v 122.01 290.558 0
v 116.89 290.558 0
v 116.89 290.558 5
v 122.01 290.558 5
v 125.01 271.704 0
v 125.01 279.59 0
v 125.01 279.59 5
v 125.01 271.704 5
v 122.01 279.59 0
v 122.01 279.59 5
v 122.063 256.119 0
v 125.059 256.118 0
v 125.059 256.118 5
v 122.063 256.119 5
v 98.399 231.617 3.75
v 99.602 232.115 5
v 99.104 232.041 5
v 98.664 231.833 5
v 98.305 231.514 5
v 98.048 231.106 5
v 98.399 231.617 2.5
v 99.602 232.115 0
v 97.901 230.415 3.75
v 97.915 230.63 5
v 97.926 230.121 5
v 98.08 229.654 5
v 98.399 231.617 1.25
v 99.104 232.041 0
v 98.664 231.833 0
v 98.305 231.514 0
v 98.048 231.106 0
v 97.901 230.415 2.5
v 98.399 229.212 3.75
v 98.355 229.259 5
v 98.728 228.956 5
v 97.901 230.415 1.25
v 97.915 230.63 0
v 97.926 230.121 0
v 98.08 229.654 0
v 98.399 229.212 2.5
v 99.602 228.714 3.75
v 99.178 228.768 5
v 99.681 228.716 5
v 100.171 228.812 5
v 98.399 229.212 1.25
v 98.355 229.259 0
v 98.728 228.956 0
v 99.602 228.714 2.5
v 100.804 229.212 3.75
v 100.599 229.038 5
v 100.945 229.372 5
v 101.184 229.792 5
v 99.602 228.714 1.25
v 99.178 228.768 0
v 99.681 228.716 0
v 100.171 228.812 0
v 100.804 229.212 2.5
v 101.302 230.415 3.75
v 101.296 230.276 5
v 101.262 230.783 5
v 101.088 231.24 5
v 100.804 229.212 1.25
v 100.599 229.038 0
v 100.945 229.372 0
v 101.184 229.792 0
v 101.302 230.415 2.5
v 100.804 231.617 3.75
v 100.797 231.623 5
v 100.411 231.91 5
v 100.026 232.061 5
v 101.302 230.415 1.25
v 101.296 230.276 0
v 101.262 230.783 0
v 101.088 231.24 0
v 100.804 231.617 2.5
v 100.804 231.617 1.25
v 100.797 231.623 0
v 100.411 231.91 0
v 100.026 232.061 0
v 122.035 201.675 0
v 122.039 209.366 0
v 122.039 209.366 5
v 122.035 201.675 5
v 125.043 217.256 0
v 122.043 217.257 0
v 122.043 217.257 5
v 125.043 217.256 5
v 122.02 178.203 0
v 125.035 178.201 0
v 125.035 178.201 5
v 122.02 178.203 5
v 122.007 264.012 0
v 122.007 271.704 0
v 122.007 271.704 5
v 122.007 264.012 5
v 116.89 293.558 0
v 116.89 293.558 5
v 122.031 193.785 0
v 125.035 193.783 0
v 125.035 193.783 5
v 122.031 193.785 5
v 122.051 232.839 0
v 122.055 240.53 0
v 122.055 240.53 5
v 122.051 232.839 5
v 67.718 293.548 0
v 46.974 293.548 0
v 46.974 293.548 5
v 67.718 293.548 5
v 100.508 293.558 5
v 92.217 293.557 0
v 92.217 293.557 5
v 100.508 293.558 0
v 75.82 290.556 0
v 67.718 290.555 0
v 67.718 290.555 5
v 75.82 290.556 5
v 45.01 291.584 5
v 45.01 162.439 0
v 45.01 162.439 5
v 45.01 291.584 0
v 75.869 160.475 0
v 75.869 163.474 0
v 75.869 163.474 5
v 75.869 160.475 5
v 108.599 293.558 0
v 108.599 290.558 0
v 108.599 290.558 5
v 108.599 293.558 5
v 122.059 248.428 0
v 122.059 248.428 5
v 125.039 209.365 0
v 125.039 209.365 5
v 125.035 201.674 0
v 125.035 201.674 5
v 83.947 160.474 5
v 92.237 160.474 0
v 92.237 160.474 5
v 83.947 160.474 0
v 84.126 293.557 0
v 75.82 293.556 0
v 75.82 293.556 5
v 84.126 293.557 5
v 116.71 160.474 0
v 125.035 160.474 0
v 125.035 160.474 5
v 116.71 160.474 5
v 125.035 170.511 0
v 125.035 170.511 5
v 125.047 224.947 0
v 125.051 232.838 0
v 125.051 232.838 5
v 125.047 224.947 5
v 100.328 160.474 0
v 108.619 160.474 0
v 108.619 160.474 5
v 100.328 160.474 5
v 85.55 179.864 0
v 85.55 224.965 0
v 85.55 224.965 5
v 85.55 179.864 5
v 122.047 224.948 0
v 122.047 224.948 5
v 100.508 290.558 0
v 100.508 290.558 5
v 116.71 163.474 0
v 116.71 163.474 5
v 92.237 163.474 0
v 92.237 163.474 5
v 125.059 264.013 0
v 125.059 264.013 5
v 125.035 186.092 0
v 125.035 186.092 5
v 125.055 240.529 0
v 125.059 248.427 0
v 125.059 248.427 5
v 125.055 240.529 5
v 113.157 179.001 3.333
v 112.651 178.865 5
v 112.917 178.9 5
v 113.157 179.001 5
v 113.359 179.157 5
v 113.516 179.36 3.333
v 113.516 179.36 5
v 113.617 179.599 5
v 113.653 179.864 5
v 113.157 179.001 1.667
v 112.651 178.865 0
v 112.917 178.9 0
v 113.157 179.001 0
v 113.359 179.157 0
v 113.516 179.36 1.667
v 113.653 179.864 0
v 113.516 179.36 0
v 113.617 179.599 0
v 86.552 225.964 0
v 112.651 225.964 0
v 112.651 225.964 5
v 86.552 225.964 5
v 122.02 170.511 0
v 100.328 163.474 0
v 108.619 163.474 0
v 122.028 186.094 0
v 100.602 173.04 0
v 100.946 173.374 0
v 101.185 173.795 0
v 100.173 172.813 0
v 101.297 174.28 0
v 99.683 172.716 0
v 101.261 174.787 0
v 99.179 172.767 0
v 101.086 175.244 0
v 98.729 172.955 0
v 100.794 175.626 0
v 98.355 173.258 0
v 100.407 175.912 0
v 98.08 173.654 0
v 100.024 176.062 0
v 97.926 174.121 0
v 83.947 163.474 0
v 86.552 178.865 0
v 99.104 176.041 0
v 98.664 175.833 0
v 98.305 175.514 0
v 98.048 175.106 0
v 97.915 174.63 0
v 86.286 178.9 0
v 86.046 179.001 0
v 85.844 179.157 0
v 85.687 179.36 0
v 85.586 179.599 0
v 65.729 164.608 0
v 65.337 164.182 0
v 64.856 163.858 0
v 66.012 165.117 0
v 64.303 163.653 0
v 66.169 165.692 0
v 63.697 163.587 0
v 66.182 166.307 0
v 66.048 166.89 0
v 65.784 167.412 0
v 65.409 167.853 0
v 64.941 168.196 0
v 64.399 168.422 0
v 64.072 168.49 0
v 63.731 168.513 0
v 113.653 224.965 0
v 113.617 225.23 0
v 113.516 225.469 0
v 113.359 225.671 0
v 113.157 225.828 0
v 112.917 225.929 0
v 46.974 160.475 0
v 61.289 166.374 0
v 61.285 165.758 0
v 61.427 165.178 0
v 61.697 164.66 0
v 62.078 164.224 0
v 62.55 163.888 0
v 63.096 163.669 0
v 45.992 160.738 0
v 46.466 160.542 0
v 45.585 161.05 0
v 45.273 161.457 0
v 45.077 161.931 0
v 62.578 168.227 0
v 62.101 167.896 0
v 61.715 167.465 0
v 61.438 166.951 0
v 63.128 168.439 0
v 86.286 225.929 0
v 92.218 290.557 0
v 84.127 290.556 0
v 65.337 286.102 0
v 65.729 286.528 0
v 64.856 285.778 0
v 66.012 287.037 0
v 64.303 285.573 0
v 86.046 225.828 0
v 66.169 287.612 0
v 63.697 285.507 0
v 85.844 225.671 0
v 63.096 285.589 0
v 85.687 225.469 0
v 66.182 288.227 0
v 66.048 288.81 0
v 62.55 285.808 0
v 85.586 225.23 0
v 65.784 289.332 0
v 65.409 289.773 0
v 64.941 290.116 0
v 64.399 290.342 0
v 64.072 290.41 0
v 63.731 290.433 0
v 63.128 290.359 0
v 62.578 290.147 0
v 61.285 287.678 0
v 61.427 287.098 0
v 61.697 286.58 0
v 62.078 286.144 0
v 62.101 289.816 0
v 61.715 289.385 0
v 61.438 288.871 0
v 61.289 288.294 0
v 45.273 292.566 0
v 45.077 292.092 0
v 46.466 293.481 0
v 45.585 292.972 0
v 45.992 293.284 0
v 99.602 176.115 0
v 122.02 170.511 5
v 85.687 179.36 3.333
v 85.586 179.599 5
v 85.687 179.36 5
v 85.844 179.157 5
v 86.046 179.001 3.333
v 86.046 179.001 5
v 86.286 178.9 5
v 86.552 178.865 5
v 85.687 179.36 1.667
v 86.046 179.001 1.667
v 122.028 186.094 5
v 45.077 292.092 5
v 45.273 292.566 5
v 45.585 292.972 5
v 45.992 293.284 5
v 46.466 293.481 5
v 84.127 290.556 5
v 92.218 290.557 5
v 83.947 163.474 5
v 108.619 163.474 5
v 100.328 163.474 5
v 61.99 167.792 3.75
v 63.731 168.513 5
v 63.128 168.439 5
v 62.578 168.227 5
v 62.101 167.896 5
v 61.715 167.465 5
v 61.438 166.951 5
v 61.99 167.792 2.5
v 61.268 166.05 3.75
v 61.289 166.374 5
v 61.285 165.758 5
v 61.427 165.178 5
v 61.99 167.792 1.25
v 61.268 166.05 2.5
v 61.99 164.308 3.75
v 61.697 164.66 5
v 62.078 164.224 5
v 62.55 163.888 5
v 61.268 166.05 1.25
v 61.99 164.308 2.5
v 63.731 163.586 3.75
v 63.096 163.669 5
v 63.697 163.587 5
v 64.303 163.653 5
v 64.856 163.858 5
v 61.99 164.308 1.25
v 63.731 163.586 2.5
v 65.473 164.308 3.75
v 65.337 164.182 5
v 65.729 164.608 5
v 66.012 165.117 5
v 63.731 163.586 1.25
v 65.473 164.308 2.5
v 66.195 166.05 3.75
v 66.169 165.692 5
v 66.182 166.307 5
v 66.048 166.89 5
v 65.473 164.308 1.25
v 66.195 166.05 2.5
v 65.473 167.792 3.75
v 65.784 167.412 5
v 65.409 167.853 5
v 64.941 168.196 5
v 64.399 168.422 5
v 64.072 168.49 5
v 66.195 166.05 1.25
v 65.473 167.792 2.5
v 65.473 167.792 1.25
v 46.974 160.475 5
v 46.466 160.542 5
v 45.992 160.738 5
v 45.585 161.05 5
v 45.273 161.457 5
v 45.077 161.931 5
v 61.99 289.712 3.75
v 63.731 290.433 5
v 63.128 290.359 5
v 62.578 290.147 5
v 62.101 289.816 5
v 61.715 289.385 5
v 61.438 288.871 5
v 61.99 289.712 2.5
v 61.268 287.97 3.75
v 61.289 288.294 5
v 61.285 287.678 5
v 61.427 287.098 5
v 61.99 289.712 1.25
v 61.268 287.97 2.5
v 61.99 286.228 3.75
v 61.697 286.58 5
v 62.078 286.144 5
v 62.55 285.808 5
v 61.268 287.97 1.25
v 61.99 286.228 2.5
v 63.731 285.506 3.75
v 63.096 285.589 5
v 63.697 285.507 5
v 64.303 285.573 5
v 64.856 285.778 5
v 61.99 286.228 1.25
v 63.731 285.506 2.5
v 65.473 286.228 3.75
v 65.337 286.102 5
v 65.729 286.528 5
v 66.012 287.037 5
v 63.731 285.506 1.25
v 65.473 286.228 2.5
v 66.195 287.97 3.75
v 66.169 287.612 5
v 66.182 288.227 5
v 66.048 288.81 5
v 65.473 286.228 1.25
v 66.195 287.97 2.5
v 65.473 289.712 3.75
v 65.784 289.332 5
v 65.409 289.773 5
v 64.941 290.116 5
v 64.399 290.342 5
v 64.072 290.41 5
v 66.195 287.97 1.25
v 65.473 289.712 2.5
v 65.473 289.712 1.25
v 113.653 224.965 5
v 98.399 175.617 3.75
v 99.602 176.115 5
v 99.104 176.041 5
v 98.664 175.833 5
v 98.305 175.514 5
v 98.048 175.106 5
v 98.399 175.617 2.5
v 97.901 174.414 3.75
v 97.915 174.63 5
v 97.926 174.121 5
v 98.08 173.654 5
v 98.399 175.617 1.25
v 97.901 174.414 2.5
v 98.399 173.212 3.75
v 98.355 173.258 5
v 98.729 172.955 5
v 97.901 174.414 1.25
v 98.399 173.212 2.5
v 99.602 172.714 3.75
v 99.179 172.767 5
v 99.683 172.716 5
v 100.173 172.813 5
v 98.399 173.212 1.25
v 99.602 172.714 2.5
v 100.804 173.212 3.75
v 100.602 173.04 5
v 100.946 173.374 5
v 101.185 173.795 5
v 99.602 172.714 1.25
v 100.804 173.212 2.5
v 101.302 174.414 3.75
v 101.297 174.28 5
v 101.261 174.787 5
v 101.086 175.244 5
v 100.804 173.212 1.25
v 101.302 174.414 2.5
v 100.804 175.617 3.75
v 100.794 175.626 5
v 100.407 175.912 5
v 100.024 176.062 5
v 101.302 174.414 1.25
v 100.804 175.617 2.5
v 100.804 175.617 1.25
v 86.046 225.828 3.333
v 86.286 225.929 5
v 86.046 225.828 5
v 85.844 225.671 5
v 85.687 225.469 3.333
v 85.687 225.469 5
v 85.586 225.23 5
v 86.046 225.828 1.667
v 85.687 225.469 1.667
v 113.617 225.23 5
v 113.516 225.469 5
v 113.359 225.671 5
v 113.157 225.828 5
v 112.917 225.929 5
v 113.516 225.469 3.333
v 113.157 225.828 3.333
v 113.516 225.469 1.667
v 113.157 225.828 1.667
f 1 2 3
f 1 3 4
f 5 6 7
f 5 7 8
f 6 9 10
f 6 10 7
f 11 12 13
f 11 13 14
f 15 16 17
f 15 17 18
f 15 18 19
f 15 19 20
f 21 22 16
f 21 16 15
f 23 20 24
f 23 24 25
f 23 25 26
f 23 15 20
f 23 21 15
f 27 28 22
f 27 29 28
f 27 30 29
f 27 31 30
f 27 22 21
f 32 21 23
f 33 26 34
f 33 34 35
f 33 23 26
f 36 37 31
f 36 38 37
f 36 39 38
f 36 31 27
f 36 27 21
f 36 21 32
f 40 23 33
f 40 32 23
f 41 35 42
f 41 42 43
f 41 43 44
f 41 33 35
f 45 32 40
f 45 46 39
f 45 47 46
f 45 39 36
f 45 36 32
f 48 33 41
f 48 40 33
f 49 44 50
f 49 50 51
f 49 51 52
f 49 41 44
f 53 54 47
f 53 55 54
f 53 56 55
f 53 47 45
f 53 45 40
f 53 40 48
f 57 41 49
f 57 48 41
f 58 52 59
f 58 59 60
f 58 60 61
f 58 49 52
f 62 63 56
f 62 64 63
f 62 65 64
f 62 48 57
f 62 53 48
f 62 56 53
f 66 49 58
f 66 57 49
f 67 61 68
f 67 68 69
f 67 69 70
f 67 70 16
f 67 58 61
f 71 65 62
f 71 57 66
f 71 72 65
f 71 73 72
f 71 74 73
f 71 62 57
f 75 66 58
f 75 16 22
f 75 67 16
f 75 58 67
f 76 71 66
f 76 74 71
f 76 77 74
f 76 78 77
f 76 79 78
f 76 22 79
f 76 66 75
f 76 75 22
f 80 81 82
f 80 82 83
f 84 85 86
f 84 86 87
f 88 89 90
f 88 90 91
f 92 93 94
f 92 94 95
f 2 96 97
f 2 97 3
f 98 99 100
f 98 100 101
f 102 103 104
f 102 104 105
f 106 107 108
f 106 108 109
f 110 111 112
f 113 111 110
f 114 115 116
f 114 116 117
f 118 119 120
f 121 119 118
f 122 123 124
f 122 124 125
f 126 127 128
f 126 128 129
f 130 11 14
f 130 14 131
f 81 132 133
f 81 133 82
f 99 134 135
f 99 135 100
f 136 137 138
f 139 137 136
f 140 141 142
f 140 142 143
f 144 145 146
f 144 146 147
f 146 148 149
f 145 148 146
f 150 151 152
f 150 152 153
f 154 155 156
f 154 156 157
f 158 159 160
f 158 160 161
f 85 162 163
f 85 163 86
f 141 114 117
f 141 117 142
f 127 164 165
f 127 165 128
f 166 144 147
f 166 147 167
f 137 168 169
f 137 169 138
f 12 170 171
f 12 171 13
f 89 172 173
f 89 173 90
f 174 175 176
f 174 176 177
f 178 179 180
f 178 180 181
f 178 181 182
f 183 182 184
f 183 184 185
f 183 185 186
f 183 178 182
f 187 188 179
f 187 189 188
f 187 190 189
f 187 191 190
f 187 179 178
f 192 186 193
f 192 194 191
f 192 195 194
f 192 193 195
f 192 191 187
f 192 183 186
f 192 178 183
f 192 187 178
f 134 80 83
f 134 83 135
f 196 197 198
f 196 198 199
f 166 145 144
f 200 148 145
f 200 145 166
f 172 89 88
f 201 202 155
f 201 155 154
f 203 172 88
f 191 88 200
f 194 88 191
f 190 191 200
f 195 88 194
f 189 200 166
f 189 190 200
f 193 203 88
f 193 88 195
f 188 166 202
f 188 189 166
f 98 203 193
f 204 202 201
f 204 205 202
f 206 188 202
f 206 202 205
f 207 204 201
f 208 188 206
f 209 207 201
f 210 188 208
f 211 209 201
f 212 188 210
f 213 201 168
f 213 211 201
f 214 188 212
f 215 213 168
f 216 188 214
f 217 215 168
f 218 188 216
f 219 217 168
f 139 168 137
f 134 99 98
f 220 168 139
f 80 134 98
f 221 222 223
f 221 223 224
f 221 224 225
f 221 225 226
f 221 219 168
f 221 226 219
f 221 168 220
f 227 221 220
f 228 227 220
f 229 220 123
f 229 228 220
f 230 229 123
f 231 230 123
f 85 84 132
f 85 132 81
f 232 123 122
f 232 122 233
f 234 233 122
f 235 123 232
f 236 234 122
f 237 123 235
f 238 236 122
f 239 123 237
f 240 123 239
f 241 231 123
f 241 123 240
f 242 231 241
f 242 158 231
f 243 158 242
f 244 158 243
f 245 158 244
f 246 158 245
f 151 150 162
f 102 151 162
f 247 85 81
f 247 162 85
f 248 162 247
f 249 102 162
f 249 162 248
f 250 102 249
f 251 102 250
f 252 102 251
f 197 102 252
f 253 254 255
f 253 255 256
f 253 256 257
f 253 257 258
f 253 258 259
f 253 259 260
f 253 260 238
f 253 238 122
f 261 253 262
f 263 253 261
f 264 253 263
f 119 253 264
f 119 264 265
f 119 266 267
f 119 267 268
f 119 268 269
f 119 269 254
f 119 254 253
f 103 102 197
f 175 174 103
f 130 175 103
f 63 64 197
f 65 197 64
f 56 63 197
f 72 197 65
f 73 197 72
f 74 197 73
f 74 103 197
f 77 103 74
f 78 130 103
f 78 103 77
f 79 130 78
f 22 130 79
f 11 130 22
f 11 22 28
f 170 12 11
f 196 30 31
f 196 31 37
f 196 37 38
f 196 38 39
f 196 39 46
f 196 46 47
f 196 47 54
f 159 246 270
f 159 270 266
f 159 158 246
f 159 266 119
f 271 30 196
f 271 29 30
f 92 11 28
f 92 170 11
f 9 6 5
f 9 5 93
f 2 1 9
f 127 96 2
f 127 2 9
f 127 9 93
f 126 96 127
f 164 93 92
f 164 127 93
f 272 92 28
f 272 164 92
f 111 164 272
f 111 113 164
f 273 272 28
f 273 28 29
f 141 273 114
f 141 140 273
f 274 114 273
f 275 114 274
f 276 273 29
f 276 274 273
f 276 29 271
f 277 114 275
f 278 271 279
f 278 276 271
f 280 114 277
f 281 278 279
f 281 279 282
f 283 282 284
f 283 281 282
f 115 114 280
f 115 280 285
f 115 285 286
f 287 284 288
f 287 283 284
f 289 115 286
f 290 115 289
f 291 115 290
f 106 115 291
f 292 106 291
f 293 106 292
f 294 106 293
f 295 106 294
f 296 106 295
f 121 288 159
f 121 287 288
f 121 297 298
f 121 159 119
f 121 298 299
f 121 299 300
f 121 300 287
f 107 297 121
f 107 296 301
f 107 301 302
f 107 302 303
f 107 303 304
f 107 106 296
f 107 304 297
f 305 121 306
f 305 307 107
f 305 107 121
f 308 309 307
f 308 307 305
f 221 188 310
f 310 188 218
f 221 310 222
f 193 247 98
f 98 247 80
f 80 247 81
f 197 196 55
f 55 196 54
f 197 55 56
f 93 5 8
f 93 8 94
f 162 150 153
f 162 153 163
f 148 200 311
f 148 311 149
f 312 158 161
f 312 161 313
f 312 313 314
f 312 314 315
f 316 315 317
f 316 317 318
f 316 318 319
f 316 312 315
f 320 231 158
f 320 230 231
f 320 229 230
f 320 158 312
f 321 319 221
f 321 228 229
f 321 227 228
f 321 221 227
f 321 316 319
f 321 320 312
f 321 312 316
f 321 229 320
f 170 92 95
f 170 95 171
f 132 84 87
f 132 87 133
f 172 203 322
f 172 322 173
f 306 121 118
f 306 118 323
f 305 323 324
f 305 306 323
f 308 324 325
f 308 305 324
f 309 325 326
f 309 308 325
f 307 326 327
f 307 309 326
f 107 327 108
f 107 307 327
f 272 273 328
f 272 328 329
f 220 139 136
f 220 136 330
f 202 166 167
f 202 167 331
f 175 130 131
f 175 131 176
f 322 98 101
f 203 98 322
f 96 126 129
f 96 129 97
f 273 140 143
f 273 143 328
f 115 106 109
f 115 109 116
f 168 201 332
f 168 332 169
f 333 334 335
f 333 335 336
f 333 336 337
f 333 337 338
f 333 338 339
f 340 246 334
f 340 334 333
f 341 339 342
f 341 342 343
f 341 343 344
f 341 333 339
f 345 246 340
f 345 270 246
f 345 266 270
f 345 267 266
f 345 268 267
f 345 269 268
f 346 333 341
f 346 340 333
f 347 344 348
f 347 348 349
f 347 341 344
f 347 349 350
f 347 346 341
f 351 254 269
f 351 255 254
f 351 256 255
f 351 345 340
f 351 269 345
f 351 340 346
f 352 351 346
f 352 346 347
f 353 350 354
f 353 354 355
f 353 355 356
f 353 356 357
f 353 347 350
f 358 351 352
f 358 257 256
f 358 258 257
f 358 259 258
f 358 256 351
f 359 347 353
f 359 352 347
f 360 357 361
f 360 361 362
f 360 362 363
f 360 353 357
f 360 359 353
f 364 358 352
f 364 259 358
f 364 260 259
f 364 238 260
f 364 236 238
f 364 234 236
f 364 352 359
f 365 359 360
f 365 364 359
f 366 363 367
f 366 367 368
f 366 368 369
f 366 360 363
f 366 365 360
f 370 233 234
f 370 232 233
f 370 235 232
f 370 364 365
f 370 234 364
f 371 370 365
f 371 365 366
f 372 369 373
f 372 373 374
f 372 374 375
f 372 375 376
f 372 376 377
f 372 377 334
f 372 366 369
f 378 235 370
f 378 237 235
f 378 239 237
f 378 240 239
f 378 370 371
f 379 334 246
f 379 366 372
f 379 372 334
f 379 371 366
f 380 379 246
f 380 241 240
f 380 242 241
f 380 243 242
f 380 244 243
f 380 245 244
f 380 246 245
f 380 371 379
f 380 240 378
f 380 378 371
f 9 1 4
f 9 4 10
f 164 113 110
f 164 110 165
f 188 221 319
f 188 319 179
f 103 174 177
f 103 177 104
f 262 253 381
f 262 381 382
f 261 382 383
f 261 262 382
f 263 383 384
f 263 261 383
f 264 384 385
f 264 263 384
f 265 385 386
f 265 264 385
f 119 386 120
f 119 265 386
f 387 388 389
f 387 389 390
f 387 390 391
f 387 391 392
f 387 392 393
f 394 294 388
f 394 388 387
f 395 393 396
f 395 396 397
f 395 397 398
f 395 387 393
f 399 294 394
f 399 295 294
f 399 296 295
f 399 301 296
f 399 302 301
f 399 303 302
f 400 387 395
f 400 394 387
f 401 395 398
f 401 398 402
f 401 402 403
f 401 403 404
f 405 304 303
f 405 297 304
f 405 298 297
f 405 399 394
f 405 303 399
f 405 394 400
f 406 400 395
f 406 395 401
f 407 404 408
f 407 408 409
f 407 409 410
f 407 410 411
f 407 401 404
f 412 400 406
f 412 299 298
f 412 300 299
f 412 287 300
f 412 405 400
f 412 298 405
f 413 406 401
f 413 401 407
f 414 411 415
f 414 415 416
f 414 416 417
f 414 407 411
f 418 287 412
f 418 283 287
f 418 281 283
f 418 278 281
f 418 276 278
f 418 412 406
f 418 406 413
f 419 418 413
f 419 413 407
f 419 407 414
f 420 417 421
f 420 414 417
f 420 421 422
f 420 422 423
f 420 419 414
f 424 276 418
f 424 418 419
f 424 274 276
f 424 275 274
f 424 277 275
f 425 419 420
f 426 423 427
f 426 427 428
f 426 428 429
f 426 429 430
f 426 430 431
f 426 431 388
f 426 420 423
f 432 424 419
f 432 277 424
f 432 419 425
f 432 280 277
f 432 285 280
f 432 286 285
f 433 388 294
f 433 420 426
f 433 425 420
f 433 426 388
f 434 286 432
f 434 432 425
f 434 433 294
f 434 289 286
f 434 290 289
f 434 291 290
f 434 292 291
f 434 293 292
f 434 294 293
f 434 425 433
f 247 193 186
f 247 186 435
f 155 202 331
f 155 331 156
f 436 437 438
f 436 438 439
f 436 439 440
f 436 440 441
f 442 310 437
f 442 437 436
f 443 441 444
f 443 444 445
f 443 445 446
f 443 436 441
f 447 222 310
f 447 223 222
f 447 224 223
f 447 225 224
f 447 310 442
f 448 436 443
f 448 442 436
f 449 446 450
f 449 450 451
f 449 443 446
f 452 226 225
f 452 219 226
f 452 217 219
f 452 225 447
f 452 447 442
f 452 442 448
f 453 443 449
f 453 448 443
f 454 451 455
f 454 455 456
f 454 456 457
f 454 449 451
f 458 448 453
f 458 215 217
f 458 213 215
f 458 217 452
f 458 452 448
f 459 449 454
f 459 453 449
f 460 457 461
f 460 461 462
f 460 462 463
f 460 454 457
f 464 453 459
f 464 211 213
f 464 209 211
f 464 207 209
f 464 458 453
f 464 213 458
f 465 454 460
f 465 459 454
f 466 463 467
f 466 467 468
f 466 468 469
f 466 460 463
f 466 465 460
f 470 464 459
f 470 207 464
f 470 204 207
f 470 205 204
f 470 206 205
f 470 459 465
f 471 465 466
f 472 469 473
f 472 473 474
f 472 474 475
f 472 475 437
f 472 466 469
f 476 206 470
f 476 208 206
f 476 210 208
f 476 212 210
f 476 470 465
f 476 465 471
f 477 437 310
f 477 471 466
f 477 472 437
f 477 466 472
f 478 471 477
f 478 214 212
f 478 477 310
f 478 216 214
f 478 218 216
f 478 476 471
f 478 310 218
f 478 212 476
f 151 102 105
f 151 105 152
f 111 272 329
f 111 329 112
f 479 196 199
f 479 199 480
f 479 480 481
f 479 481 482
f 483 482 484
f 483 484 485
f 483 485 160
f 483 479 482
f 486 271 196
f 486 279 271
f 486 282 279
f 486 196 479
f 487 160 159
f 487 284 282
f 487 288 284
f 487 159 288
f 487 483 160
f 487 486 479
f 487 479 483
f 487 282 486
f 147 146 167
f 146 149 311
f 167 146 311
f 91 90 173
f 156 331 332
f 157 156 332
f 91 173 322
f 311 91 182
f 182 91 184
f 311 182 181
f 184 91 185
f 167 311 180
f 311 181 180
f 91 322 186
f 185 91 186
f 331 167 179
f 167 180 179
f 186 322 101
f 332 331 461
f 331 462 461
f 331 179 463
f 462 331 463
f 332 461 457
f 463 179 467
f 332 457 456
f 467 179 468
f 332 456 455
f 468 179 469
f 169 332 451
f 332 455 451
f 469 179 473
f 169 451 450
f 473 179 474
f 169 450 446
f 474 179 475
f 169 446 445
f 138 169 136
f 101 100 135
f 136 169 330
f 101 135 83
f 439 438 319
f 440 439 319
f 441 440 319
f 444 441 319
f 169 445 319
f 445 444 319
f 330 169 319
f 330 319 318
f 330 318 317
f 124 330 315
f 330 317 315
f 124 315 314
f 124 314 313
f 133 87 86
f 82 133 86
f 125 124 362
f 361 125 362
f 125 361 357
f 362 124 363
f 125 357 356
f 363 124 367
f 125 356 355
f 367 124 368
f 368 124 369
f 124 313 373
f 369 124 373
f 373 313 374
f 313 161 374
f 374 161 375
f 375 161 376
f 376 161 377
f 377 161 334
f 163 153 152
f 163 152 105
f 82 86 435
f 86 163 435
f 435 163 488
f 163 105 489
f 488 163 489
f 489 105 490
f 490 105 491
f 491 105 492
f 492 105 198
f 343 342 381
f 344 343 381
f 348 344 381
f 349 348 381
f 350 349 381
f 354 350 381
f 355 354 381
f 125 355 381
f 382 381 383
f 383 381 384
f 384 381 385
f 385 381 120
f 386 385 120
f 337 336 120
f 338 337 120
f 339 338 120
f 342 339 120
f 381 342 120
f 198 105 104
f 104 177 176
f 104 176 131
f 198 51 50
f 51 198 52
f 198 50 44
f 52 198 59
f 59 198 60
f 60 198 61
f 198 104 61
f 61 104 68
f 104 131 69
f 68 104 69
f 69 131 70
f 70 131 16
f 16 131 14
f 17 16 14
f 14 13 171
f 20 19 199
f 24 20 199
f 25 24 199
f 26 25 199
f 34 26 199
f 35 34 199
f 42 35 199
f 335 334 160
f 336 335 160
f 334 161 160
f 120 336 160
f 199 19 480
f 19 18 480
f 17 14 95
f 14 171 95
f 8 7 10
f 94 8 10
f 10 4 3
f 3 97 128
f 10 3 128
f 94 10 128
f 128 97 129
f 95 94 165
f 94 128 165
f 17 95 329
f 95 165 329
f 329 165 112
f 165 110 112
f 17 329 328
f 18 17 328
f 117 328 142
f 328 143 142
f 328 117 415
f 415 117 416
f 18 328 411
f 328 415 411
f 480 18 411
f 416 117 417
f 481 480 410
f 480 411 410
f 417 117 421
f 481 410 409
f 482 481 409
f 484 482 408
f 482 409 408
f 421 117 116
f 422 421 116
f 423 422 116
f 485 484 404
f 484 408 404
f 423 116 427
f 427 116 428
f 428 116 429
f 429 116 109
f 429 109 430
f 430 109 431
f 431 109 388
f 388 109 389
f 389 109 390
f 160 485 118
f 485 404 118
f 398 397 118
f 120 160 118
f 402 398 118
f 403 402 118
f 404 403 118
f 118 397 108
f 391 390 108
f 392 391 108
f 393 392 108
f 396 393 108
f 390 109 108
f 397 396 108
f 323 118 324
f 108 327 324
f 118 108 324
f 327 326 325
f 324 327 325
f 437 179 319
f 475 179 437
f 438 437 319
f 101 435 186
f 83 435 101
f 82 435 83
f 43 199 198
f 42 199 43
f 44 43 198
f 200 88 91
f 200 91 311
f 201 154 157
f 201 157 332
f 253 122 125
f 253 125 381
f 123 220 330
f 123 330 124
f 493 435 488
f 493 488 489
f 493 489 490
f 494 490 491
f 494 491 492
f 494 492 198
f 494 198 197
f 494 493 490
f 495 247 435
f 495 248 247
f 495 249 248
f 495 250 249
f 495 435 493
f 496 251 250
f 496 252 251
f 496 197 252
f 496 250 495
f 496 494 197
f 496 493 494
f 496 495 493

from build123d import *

# Parameters (mm, degrees)
BOSS_EXTRUDE1_DEPTH = 5


with BuildPart() as part:
    # Sketch1 → Boss-Extrude1 (new body)
    with BuildSketch(Plane.XY):
        with BuildLine():
            Line((122.019699995, 170.510603399), (125.035491487, 170.510603399))
            Line((125.035491487, 170.510603399), (125.035491487, 160.474074598))
            Line((125.035491487, 160.474074598), (116.710185498, 160.474074598))
            Line((116.710185498, 160.474074598), (116.710185498, 163.474068598))
            Line((116.710185498, 163.474068598), (108.619297498, 163.474068598))
            Line((108.619297498, 163.474068598), (108.619297498, 160.474074598))
            Line((108.619297498, 160.474074598), (100.328384498, 160.474074598))
            Line((100.328384498, 160.474074598), (100.328384498, 163.474068598))
            Line((100.328384498, 163.474068598), (92.237463498, 163.474068598))
            Line((92.237463498, 163.474068598), (92.237463498, 160.474074598))
            Line((92.237463498, 160.474074598), (83.946550498, 160.474074598))
            Line((83.946550498, 160.474074598), (83.946550498, 163.474068598))
            Line((83.946550498, 163.474068598), (75.868574498, 163.474068598))
            Line((75.868574498, 163.474068598), (75.868574498, 160.474804118))
            Line((75.868574498, 160.474804118), (46.973908888, 160.474804118))
            ThreePointArc((46.973908888, 160.474804118), (45.585129957, 161.050055187), (45.009878888, 162.438834118))
            Line((45.009878888, 162.438834118), (45.009878888, 291.583555118))
            ThreePointArc((45.009878888, 291.583555118), (45.585129957, 292.972334049), (46.973908888, 293.547585118))
            Line((46.973908888, 293.547585118), (67.718123868, 293.547585118))
            Line((67.718123868, 293.547585118), (67.71835615, 290.555211127))
            Line((67.71835615, 290.555211127), (75.820281125, 290.555840035))
            Line((75.820281125, 290.555840035), (75.82004825, 293.555862026))
            Line((75.82004825, 293.555862026), (84.126345225, 293.556506799))
            Line((84.126345225, 293.556506799), (84.1265781, 290.556484808))
            Line((84.1265781, 290.556484808), (92.217503076, 290.557112862))
            Line((92.217503076, 290.557112862), (92.217270201, 293.557134853))
            Line((92.217270201, 293.557134853), (100.508146176, 293.557778429))
            Line((100.508146176, 293.557778429), (100.508379051, 290.557756438))
            Line((100.508379051, 290.557756438), (108.599303027, 290.558384492))
            Line((108.599303027, 290.558384492), (108.599070151, 293.558406483))
            Line((108.599070151, 293.558406483), (116.889983151, 293.558406483))
            Line((116.889983151, 293.558406483), (116.889983151, 290.558384483))
            Line((116.889983151, 290.558384483), (122.009855888, 290.558384483))
            Line((122.009855888, 290.558384483), (122.009855888, 279.590084215))
            Line((122.009855888, 279.590084215), (125.009878888, 279.590084215))
            Line((125.009878888, 279.590084215), (125.009878888, 271.704151215))
            Line((125.009878888, 271.704151215), (122.007220126, 271.704151215))
            Line((122.007220126, 271.704151215), (122.007220126, 264.011738232))
            Line((122.007220126, 264.011738232), (125.059148145, 264.013282494))
            Line((125.059148145, 264.013282494), (125.059148145, 256.117565387))
            Line((125.059148145, 256.117565387), (122.063013449, 256.119081417))
            Line((122.063013449, 256.119081417), (122.059121879, 248.428160402))
            Line((122.059121879, 248.428160402), (125.059148145, 248.426642402))
            Line((125.059148145, 248.426642402), (125.055151734, 240.528524414))
            Line((125.055151734, 240.528524414), (122.055129118, 240.530042412))
            Line((122.055129118, 240.530042412), (122.051237547, 232.839120396))
            Line((122.051237547, 232.839120396), (125.051260163, 232.837602399))
            Line((125.051260163, 232.837602399), (125.047267389, 224.946670409))
            Line((125.047267389, 224.946670409), (122.047244773, 224.948188407))
            Line((122.047244773, 224.948188407), (122.043353202, 217.257267391))
            Line((122.043353202, 217.257267391), (125.043375818, 217.255749394))
            Line((125.043375818, 217.255749394), (125.039383043, 209.364816404))
            Line((125.039383043, 209.364816404), (122.039360427, 209.366334401))
            Line((122.039360427, 209.366334401), (122.035468871, 201.675441386))
            Line((122.035468871, 201.675441386), (125.035491487, 201.673923388))
            Line((125.035491487, 201.673923388), (125.035491487, 193.78332734))
            Line((125.035491487, 193.78332734), (122.031476282, 193.784876396))
            Line((122.031476282, 193.784876396), (122.027584712, 186.09395438))
            Line((122.027584712, 186.09395438), (125.035491487, 186.092432394))
            Line((125.035491487, 186.092432394), (125.035491487, 178.201498384))
            Line((125.035491487, 178.201498384), (122.019699995, 178.20302436))
            Line((122.019699995, 178.20302436), (122.019699995, 170.510603399))
        make_face()
        with BuildLine():
            Line((86.552275995, 178.864581399), (112.650775995, 178.864581399))
            add(Edge.make_bspline(
                [(112.650775995, 178.864581399), (113.204636995, 178.864581399), (113.652664995, 179.312256399), (113.652664995, 179.864354399)],
                knots=[0, 0, 0, 0, 1, 1, 1, 1], degree=3))
            Line((113.652664995, 179.864354399), (113.652664995, 224.964558399))
            add(Edge.make_bspline(
                [(113.652664995, 224.964558399), (113.652664995, 225.516656399), (113.204636995, 225.964331399), (112.650775995, 225.964331399)],
                knots=[0, 0, 0, 0, 1, 1, 1, 1], degree=3))
            Line((112.650775995, 225.964331399), (86.552275995, 225.964331399))
            add(Edge.make_bspline(
                [(86.552275995, 225.964331399), (85.998414995, 225.964331399), (85.550386995, 225.516656399), (85.550386995, 224.964558399)],
                knots=[0, 0, 0, 0, 1, 1, 1, 1], degree=3))
            Line((85.550386995, 224.964558399), (85.550386995, 179.864354399))
            add(Edge.make_bspline(
                [(85.550386995, 179.864354399), (85.550386995, 179.312256399), (85.998414995, 178.864581399), (86.552275995, 178.864581399)],
                knots=[0, 0, 0, 0, 1, 1, 1, 1], degree=3))
        make_face(mode=Mode.SUBTRACT)
        with BuildLine():
            add(Edge.make_bspline(
                [(97.901136995, 230.414622399), (97.901136995, 229.475528399), (98.663136995, 228.714233399), (99.601525995, 228.714233399)],
                knots=[0, 0, 0, 0, 1, 1, 1, 1], degree=3))
            add(Edge.make_bspline(
                [(99.601525995, 228.714233399), (100.539914995, 228.714233399), (101.301914995, 229.475528399), (101.301914995, 230.414622399)],
                knots=[0, 0, 0, 0, 1, 1, 1, 1], degree=3))
            add(Edge.make_bspline(
                [(101.301914995, 230.414622399), (101.301914995, 231.353364399), (100.539914995, 232.114658399), (99.601525995, 232.114658399)],
                knots=[0, 0, 0, 0, 1, 1, 1, 1], degree=3))
            add(Edge.make_bspline(
                [(99.601525995, 232.114658399), (98.663136995, 232.114658399), (97.901136995, 231.353364399), (97.901136995, 230.414622399)],
                knots=[0, 0, 0, 0, 1, 1, 1, 1], degree=3))
        make_face(mode=Mode.SUBTRACT)
        with BuildLine():
            add(Edge.make_bspline(
                [(97.901136995, 174.414290399), (97.901136995, 173.475548399), (98.663136995, 172.714254399), (99.601525995, 172.714254399)],
                knots=[0, 0, 0, 0, 1, 1, 1, 1], degree=3))
            add(Edge.make_bspline(
                [(99.601525995, 172.714254399), (100.539914995, 172.714254399), (101.301914995, 173.475548399), (101.301914995, 174.414290399)],
                knots=[0, 0, 0, 0, 1, 1, 1, 1], degree=3))
            add(Edge.make_bspline(
                [(101.301914995, 174.414290399), (101.301914995, 175.353384399), (100.539914995, 176.114679399), (99.601525995, 176.114679399)],
                knots=[0, 0, 0, 0, 1, 1, 1, 1], degree=3))
            add(Edge.make_bspline(
                [(99.601525995, 176.114679399), (98.663136995, 176.114679399), (97.901136995, 175.353384399), (97.901136995, 174.414290399)],
                knots=[0, 0, 0, 0, 1, 1, 1, 1], degree=3))
        make_face(mode=Mode.SUBTRACT)
        with BuildLine():
            add(Edge.make_bspline(
                [(61.267952995, 166.050110399), (61.267952995, 164.689432399), (62.371907995, 163.586384399), (63.731417995, 163.586384399)],
                knots=[0, 0, 0, 0, 1, 1, 1, 1], degree=3))
            add(Edge.make_bspline(
                [(63.731417995, 163.586384399), (65.090924995, 163.586384399), (66.194885995, 164.689432399), (66.194885995, 166.050110399)],
                knots=[0, 0, 0, 0, 1, 1, 1, 1], degree=3))
            add(Edge.make_bspline(
                [(66.194885995, 166.050110399), (66.194885995, 167.410262399), (65.090924995, 168.513317399), (63.731417995, 168.513317399)],
                knots=[0, 0, 0, 0, 1, 1, 1, 1], degree=3))
            add(Edge.make_bspline(
                [(63.731417995, 168.513317399), (62.371907995, 168.513317399), (61.267952995, 167.410262399), (61.267952995, 166.050110399)],
                knots=[0, 0, 0, 0, 1, 1, 1, 1], degree=3))
        make_face(mode=Mode.SUBTRACT)
        with BuildLine():
            add(Edge.make_bspline(
                [(61.267952995, 287.970112399), (61.267952995, 286.609434399), (62.371907995, 285.506386399), (63.731417995, 285.506386399)],
                knots=[0, 0, 0, 0, 1, 1, 1, 1], degree=3))
            add(Edge.make_bspline(
                [(63.731417995, 285.506386399), (65.090924995, 285.506386399), (66.194885995, 286.609434399), (66.194885995, 287.970112399)],
                knots=[0, 0, 0, 0, 1, 1, 1, 1], degree=3))
            add(Edge.make_bspline(
                [(66.194885995, 287.970112399), (66.194885995, 289.330264399), (65.090924995, 290.433319399), (63.731417995, 290.433319399)],
                knots=[0, 0, 0, 0, 1, 1, 1, 1], degree=3))
            add(Edge.make_bspline(
                [(63.731417995, 290.433319399), (62.371907995, 290.433319399), (61.267952995, 289.330264399), (61.267952995, 287.970112399)],
                knots=[0, 0, 0, 0, 1, 1, 1, 1], degree=3))
        make_face(mode=Mode.SUBTRACT)
    extrude(amount=BOSS_EXTRUDE1_DEPTH)


solid = part.part
